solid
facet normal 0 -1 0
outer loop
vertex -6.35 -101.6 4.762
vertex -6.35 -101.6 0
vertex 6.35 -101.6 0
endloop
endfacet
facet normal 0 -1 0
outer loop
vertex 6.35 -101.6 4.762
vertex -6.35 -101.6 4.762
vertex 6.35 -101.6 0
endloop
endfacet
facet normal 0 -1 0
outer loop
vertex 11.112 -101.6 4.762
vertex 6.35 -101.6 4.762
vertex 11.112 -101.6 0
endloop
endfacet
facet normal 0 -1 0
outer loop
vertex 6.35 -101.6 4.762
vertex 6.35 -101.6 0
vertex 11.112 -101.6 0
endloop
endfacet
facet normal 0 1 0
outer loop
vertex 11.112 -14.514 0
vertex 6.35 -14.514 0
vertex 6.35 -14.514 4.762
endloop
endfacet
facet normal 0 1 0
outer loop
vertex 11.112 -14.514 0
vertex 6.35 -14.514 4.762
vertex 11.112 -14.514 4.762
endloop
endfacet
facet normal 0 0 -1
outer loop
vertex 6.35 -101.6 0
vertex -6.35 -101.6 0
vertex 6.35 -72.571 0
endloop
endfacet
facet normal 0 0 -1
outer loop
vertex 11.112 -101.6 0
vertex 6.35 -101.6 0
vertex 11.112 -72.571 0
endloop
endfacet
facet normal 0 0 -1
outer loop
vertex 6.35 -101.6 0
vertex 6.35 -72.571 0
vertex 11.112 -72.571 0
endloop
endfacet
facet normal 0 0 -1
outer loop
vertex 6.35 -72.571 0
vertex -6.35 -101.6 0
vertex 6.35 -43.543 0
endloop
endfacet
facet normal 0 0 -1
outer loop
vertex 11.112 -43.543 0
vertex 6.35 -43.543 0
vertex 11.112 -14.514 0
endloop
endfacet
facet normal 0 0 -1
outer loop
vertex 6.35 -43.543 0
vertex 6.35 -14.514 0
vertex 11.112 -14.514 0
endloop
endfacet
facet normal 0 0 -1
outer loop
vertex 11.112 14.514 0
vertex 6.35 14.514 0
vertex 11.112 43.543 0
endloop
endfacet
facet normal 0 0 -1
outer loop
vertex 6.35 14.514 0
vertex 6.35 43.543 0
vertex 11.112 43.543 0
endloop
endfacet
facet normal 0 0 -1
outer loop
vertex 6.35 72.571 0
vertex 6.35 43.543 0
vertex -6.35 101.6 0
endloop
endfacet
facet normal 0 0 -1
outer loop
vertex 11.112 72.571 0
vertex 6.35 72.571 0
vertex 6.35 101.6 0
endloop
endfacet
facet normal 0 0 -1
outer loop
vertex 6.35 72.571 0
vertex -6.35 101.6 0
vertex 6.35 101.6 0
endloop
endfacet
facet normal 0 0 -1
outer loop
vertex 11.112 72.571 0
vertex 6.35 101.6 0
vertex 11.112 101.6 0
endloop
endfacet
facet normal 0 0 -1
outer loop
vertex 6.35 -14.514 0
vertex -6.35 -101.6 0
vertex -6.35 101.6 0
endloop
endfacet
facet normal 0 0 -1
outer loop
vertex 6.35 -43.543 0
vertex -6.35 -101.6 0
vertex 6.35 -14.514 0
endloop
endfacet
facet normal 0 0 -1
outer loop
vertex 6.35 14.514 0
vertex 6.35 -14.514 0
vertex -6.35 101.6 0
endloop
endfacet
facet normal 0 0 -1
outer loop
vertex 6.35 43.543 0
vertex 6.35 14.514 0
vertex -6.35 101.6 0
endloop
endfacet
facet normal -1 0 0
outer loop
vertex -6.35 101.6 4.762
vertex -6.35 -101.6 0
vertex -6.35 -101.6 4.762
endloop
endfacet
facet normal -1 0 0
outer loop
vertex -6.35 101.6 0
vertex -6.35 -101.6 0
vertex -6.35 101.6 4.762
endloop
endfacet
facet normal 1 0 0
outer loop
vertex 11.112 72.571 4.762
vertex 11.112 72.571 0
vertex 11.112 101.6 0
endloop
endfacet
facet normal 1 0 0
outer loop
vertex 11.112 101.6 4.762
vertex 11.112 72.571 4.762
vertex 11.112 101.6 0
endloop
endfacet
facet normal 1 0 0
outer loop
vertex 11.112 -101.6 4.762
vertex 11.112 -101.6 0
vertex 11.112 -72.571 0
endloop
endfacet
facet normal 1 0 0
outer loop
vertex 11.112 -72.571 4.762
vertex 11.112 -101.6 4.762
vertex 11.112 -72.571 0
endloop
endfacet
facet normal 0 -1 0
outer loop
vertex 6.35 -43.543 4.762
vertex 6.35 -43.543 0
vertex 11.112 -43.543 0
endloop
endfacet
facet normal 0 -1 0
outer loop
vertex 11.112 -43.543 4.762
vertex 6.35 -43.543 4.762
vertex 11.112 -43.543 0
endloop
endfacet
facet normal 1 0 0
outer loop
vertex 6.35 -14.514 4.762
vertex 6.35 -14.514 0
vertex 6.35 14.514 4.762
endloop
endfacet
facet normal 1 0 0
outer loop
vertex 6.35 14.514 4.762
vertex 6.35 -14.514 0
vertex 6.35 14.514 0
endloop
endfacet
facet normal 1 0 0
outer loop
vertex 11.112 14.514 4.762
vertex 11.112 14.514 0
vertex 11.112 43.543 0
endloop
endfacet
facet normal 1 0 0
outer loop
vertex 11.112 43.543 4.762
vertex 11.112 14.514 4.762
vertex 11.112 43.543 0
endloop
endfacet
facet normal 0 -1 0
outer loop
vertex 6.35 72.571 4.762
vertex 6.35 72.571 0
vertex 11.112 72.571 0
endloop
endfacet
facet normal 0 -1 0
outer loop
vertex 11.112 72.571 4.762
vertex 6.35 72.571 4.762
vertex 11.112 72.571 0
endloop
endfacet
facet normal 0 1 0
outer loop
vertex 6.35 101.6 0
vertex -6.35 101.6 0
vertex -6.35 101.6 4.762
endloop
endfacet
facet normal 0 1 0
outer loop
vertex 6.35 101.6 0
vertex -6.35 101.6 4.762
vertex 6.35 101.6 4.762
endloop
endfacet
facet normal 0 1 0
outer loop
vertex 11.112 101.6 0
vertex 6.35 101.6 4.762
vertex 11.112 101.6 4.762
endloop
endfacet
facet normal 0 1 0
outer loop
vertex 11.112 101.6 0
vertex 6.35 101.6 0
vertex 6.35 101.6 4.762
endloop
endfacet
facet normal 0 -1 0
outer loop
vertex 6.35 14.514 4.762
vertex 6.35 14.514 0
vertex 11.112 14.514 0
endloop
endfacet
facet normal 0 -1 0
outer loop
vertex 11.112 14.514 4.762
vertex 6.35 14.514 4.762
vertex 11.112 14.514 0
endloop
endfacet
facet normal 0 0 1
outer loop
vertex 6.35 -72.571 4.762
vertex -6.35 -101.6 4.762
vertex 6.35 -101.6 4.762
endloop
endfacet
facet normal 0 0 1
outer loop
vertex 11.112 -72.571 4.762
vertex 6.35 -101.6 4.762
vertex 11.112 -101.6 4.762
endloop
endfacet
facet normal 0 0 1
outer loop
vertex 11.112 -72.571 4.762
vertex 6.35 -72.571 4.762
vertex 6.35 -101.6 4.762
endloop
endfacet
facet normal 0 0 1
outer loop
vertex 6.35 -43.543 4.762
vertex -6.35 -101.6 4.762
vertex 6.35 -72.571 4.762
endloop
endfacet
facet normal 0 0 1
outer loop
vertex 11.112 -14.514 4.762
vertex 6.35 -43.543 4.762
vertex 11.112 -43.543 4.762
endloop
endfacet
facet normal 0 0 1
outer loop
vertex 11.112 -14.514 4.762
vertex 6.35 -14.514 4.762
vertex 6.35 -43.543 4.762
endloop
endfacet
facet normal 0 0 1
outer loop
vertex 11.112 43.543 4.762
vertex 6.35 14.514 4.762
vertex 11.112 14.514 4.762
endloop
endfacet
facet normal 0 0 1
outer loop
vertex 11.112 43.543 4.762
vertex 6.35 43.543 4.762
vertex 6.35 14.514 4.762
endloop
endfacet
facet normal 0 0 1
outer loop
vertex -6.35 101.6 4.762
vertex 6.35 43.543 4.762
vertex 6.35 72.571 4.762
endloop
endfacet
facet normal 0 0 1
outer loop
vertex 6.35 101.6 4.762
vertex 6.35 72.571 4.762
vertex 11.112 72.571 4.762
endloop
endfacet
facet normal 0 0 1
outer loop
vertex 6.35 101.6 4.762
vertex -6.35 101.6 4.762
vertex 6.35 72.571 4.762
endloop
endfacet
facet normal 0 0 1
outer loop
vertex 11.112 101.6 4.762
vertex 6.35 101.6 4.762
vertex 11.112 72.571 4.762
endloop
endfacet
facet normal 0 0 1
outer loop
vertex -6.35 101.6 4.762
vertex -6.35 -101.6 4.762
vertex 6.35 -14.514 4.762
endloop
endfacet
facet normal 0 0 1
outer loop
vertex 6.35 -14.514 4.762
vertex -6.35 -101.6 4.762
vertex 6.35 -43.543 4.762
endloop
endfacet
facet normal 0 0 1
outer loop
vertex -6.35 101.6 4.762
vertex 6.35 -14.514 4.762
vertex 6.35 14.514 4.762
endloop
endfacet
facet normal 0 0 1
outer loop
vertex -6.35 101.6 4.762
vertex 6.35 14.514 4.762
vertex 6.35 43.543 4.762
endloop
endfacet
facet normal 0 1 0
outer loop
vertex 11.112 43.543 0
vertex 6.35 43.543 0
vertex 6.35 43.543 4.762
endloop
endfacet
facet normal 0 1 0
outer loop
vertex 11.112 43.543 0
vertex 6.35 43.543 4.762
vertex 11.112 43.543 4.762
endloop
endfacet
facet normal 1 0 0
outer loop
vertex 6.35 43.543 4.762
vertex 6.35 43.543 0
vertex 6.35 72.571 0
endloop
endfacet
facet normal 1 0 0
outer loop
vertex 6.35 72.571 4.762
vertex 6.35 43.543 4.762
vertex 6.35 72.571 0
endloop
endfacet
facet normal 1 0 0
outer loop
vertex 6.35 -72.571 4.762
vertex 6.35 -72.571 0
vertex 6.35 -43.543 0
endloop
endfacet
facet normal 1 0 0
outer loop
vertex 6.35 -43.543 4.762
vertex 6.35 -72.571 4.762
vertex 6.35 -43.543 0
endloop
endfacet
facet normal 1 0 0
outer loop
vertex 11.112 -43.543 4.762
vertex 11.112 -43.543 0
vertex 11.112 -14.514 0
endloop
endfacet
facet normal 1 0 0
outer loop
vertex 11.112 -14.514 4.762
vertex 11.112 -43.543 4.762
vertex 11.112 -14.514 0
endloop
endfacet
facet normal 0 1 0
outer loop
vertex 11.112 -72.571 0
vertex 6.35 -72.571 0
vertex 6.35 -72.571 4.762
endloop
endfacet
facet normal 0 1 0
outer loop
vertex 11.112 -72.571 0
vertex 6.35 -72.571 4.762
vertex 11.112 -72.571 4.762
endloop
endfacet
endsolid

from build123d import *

# Parameters (mm, degrees)
SKETCH1_W           = 6.35
SKETCH1_H           = 203.2
SKETCH1_W_2         = 4.7625
SKETCH1_H_2         = 29.028571429
BOSS_EXTRUDE1_DEPTH = 4.7625


with BuildPart() as part:
    # Sketch1 → Boss-Extrude1 (new body)
    with BuildSketch(Plane.XY):
        with Locations((-3.175, 0)):
            Rectangle(SKETCH1_W, SKETCH1_H)
        Polygon((6.35, 101.6), (0, 101.6), (0, -101.6), (6.35, -101.6), (6.35, -72.571428571), (6.35, -43.542857143), (6.35, -14.514285714), (6.35, 14.514285714), (6.35, 43.542857143), (6.35, 72.571428571), align=None)
        with Locations((8.73125, 87.085714286)):
            Rectangle(SKETCH1_W_2, SKETCH1_H_2)
        with Locations((8.73125, 29.028571429)):
            Rectangle(SKETCH1_W_2, SKETCH1_H_2)
        with Locations((8.73125, -29.028571429)):
            Rectangle(SKETCH1_W_2, SKETCH1_H_2)
        with Locations((8.73125, -87.085714286)):
            Rectangle(SKETCH1_W_2, SKETCH1_H_2)
    extrude(amount=BOSS_EXTRUDE1_DEPTH)


solid = part.part
